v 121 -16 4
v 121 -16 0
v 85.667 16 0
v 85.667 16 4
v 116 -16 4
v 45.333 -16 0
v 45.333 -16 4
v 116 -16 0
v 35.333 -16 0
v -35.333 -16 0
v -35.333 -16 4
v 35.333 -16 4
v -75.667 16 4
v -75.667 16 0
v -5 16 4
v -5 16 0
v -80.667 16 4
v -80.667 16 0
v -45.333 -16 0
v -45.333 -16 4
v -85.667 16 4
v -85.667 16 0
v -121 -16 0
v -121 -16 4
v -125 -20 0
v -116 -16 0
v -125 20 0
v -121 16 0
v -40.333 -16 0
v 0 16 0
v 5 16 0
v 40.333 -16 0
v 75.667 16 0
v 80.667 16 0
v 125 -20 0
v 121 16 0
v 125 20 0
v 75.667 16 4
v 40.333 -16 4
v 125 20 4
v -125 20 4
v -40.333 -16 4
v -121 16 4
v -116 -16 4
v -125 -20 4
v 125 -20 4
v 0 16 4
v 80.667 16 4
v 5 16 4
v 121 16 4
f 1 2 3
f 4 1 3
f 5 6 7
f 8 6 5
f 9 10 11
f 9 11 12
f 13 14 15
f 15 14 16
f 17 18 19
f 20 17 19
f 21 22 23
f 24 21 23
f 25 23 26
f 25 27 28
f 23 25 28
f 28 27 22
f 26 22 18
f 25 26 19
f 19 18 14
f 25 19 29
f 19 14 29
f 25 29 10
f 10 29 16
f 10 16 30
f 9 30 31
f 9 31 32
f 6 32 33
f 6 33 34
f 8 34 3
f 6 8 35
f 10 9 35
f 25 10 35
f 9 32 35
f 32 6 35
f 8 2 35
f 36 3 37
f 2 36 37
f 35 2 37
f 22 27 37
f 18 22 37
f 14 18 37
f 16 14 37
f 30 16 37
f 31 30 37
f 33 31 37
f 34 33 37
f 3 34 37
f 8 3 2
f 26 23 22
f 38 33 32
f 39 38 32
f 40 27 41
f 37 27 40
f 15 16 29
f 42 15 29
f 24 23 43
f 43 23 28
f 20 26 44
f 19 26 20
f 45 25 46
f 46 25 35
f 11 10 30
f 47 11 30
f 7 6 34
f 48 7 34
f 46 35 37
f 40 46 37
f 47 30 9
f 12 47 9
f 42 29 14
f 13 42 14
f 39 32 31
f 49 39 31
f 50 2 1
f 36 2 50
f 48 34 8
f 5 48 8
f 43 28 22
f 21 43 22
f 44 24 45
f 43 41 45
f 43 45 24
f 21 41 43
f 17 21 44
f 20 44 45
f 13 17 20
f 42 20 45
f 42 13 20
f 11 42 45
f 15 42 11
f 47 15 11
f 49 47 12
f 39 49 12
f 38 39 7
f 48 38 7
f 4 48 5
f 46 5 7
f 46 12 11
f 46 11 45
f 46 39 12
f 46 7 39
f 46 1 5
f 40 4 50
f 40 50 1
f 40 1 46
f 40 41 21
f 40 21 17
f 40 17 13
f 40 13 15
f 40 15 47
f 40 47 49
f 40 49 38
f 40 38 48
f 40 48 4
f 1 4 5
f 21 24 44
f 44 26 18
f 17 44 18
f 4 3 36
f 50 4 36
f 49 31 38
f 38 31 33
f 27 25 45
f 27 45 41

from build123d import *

# Parameters (mm, degrees)
SKETCH_1_W      = 250
SKETCH_1_H      = 40
SKETCH_1_W_2    = 242
SKETCH_1_H_2    = 32
EXTRUDE_1_DEPTH = 4


with BuildPart() as part:
    # 草图1 → 凸台-拉伸1 (new body)
    # profile 1 of 7: a face of its own
    with BuildSketch(Plane.XY):
        Rectangle(SKETCH_1_W, SKETCH_1_H)
        Rectangle(SKETCH_1_W_2, SKETCH_1_H_2, mode=Mode.SUBTRACT)
    # profile 2 of 7: a face of its own
    with BuildSketch(Plane.XY):
        Polygon((-80.666666667, 16), (-85.666666667, 16), (-121, -16), (-116, -16), align=None)
    # profile 3 of 7: a face of its own
    with BuildSketch(Plane.XY):
        Polygon((-75.666666667, 16), (-80.666666667, 16), (-45.333333333, -16), (-40.333333333, -16), align=None)
    # profile 4 of 7: a face of its own
    with BuildSketch(Plane.XY):
        Polygon((0, 16), (-5, 16), (-40.333333333, -16), (-35.333333333, -16), align=None)
    # profile 5 of 7: a face of its own
    with BuildSketch(Plane.XY):
        Polygon((5, 16), (0, 16), (35.333333333, -16), (40.333333333, -16), align=None)
    # profile 6 of 7: a face of its own
    with BuildSketch(Plane.XY):
        Polygon((80.666666667, 16), (75.666666667, 16), (40.333333333, -16), (45.333333333, -16), align=None)
    # profile 7 of 7: a face of its own
    with BuildSketch(Plane.XY):
        Polygon((85.666666667, 16), (80.666666667, 16), (116, -16), (121, -16), align=None)
    extrude(amount=EXTRUDE_1_DEPTH)


solid = part.part
